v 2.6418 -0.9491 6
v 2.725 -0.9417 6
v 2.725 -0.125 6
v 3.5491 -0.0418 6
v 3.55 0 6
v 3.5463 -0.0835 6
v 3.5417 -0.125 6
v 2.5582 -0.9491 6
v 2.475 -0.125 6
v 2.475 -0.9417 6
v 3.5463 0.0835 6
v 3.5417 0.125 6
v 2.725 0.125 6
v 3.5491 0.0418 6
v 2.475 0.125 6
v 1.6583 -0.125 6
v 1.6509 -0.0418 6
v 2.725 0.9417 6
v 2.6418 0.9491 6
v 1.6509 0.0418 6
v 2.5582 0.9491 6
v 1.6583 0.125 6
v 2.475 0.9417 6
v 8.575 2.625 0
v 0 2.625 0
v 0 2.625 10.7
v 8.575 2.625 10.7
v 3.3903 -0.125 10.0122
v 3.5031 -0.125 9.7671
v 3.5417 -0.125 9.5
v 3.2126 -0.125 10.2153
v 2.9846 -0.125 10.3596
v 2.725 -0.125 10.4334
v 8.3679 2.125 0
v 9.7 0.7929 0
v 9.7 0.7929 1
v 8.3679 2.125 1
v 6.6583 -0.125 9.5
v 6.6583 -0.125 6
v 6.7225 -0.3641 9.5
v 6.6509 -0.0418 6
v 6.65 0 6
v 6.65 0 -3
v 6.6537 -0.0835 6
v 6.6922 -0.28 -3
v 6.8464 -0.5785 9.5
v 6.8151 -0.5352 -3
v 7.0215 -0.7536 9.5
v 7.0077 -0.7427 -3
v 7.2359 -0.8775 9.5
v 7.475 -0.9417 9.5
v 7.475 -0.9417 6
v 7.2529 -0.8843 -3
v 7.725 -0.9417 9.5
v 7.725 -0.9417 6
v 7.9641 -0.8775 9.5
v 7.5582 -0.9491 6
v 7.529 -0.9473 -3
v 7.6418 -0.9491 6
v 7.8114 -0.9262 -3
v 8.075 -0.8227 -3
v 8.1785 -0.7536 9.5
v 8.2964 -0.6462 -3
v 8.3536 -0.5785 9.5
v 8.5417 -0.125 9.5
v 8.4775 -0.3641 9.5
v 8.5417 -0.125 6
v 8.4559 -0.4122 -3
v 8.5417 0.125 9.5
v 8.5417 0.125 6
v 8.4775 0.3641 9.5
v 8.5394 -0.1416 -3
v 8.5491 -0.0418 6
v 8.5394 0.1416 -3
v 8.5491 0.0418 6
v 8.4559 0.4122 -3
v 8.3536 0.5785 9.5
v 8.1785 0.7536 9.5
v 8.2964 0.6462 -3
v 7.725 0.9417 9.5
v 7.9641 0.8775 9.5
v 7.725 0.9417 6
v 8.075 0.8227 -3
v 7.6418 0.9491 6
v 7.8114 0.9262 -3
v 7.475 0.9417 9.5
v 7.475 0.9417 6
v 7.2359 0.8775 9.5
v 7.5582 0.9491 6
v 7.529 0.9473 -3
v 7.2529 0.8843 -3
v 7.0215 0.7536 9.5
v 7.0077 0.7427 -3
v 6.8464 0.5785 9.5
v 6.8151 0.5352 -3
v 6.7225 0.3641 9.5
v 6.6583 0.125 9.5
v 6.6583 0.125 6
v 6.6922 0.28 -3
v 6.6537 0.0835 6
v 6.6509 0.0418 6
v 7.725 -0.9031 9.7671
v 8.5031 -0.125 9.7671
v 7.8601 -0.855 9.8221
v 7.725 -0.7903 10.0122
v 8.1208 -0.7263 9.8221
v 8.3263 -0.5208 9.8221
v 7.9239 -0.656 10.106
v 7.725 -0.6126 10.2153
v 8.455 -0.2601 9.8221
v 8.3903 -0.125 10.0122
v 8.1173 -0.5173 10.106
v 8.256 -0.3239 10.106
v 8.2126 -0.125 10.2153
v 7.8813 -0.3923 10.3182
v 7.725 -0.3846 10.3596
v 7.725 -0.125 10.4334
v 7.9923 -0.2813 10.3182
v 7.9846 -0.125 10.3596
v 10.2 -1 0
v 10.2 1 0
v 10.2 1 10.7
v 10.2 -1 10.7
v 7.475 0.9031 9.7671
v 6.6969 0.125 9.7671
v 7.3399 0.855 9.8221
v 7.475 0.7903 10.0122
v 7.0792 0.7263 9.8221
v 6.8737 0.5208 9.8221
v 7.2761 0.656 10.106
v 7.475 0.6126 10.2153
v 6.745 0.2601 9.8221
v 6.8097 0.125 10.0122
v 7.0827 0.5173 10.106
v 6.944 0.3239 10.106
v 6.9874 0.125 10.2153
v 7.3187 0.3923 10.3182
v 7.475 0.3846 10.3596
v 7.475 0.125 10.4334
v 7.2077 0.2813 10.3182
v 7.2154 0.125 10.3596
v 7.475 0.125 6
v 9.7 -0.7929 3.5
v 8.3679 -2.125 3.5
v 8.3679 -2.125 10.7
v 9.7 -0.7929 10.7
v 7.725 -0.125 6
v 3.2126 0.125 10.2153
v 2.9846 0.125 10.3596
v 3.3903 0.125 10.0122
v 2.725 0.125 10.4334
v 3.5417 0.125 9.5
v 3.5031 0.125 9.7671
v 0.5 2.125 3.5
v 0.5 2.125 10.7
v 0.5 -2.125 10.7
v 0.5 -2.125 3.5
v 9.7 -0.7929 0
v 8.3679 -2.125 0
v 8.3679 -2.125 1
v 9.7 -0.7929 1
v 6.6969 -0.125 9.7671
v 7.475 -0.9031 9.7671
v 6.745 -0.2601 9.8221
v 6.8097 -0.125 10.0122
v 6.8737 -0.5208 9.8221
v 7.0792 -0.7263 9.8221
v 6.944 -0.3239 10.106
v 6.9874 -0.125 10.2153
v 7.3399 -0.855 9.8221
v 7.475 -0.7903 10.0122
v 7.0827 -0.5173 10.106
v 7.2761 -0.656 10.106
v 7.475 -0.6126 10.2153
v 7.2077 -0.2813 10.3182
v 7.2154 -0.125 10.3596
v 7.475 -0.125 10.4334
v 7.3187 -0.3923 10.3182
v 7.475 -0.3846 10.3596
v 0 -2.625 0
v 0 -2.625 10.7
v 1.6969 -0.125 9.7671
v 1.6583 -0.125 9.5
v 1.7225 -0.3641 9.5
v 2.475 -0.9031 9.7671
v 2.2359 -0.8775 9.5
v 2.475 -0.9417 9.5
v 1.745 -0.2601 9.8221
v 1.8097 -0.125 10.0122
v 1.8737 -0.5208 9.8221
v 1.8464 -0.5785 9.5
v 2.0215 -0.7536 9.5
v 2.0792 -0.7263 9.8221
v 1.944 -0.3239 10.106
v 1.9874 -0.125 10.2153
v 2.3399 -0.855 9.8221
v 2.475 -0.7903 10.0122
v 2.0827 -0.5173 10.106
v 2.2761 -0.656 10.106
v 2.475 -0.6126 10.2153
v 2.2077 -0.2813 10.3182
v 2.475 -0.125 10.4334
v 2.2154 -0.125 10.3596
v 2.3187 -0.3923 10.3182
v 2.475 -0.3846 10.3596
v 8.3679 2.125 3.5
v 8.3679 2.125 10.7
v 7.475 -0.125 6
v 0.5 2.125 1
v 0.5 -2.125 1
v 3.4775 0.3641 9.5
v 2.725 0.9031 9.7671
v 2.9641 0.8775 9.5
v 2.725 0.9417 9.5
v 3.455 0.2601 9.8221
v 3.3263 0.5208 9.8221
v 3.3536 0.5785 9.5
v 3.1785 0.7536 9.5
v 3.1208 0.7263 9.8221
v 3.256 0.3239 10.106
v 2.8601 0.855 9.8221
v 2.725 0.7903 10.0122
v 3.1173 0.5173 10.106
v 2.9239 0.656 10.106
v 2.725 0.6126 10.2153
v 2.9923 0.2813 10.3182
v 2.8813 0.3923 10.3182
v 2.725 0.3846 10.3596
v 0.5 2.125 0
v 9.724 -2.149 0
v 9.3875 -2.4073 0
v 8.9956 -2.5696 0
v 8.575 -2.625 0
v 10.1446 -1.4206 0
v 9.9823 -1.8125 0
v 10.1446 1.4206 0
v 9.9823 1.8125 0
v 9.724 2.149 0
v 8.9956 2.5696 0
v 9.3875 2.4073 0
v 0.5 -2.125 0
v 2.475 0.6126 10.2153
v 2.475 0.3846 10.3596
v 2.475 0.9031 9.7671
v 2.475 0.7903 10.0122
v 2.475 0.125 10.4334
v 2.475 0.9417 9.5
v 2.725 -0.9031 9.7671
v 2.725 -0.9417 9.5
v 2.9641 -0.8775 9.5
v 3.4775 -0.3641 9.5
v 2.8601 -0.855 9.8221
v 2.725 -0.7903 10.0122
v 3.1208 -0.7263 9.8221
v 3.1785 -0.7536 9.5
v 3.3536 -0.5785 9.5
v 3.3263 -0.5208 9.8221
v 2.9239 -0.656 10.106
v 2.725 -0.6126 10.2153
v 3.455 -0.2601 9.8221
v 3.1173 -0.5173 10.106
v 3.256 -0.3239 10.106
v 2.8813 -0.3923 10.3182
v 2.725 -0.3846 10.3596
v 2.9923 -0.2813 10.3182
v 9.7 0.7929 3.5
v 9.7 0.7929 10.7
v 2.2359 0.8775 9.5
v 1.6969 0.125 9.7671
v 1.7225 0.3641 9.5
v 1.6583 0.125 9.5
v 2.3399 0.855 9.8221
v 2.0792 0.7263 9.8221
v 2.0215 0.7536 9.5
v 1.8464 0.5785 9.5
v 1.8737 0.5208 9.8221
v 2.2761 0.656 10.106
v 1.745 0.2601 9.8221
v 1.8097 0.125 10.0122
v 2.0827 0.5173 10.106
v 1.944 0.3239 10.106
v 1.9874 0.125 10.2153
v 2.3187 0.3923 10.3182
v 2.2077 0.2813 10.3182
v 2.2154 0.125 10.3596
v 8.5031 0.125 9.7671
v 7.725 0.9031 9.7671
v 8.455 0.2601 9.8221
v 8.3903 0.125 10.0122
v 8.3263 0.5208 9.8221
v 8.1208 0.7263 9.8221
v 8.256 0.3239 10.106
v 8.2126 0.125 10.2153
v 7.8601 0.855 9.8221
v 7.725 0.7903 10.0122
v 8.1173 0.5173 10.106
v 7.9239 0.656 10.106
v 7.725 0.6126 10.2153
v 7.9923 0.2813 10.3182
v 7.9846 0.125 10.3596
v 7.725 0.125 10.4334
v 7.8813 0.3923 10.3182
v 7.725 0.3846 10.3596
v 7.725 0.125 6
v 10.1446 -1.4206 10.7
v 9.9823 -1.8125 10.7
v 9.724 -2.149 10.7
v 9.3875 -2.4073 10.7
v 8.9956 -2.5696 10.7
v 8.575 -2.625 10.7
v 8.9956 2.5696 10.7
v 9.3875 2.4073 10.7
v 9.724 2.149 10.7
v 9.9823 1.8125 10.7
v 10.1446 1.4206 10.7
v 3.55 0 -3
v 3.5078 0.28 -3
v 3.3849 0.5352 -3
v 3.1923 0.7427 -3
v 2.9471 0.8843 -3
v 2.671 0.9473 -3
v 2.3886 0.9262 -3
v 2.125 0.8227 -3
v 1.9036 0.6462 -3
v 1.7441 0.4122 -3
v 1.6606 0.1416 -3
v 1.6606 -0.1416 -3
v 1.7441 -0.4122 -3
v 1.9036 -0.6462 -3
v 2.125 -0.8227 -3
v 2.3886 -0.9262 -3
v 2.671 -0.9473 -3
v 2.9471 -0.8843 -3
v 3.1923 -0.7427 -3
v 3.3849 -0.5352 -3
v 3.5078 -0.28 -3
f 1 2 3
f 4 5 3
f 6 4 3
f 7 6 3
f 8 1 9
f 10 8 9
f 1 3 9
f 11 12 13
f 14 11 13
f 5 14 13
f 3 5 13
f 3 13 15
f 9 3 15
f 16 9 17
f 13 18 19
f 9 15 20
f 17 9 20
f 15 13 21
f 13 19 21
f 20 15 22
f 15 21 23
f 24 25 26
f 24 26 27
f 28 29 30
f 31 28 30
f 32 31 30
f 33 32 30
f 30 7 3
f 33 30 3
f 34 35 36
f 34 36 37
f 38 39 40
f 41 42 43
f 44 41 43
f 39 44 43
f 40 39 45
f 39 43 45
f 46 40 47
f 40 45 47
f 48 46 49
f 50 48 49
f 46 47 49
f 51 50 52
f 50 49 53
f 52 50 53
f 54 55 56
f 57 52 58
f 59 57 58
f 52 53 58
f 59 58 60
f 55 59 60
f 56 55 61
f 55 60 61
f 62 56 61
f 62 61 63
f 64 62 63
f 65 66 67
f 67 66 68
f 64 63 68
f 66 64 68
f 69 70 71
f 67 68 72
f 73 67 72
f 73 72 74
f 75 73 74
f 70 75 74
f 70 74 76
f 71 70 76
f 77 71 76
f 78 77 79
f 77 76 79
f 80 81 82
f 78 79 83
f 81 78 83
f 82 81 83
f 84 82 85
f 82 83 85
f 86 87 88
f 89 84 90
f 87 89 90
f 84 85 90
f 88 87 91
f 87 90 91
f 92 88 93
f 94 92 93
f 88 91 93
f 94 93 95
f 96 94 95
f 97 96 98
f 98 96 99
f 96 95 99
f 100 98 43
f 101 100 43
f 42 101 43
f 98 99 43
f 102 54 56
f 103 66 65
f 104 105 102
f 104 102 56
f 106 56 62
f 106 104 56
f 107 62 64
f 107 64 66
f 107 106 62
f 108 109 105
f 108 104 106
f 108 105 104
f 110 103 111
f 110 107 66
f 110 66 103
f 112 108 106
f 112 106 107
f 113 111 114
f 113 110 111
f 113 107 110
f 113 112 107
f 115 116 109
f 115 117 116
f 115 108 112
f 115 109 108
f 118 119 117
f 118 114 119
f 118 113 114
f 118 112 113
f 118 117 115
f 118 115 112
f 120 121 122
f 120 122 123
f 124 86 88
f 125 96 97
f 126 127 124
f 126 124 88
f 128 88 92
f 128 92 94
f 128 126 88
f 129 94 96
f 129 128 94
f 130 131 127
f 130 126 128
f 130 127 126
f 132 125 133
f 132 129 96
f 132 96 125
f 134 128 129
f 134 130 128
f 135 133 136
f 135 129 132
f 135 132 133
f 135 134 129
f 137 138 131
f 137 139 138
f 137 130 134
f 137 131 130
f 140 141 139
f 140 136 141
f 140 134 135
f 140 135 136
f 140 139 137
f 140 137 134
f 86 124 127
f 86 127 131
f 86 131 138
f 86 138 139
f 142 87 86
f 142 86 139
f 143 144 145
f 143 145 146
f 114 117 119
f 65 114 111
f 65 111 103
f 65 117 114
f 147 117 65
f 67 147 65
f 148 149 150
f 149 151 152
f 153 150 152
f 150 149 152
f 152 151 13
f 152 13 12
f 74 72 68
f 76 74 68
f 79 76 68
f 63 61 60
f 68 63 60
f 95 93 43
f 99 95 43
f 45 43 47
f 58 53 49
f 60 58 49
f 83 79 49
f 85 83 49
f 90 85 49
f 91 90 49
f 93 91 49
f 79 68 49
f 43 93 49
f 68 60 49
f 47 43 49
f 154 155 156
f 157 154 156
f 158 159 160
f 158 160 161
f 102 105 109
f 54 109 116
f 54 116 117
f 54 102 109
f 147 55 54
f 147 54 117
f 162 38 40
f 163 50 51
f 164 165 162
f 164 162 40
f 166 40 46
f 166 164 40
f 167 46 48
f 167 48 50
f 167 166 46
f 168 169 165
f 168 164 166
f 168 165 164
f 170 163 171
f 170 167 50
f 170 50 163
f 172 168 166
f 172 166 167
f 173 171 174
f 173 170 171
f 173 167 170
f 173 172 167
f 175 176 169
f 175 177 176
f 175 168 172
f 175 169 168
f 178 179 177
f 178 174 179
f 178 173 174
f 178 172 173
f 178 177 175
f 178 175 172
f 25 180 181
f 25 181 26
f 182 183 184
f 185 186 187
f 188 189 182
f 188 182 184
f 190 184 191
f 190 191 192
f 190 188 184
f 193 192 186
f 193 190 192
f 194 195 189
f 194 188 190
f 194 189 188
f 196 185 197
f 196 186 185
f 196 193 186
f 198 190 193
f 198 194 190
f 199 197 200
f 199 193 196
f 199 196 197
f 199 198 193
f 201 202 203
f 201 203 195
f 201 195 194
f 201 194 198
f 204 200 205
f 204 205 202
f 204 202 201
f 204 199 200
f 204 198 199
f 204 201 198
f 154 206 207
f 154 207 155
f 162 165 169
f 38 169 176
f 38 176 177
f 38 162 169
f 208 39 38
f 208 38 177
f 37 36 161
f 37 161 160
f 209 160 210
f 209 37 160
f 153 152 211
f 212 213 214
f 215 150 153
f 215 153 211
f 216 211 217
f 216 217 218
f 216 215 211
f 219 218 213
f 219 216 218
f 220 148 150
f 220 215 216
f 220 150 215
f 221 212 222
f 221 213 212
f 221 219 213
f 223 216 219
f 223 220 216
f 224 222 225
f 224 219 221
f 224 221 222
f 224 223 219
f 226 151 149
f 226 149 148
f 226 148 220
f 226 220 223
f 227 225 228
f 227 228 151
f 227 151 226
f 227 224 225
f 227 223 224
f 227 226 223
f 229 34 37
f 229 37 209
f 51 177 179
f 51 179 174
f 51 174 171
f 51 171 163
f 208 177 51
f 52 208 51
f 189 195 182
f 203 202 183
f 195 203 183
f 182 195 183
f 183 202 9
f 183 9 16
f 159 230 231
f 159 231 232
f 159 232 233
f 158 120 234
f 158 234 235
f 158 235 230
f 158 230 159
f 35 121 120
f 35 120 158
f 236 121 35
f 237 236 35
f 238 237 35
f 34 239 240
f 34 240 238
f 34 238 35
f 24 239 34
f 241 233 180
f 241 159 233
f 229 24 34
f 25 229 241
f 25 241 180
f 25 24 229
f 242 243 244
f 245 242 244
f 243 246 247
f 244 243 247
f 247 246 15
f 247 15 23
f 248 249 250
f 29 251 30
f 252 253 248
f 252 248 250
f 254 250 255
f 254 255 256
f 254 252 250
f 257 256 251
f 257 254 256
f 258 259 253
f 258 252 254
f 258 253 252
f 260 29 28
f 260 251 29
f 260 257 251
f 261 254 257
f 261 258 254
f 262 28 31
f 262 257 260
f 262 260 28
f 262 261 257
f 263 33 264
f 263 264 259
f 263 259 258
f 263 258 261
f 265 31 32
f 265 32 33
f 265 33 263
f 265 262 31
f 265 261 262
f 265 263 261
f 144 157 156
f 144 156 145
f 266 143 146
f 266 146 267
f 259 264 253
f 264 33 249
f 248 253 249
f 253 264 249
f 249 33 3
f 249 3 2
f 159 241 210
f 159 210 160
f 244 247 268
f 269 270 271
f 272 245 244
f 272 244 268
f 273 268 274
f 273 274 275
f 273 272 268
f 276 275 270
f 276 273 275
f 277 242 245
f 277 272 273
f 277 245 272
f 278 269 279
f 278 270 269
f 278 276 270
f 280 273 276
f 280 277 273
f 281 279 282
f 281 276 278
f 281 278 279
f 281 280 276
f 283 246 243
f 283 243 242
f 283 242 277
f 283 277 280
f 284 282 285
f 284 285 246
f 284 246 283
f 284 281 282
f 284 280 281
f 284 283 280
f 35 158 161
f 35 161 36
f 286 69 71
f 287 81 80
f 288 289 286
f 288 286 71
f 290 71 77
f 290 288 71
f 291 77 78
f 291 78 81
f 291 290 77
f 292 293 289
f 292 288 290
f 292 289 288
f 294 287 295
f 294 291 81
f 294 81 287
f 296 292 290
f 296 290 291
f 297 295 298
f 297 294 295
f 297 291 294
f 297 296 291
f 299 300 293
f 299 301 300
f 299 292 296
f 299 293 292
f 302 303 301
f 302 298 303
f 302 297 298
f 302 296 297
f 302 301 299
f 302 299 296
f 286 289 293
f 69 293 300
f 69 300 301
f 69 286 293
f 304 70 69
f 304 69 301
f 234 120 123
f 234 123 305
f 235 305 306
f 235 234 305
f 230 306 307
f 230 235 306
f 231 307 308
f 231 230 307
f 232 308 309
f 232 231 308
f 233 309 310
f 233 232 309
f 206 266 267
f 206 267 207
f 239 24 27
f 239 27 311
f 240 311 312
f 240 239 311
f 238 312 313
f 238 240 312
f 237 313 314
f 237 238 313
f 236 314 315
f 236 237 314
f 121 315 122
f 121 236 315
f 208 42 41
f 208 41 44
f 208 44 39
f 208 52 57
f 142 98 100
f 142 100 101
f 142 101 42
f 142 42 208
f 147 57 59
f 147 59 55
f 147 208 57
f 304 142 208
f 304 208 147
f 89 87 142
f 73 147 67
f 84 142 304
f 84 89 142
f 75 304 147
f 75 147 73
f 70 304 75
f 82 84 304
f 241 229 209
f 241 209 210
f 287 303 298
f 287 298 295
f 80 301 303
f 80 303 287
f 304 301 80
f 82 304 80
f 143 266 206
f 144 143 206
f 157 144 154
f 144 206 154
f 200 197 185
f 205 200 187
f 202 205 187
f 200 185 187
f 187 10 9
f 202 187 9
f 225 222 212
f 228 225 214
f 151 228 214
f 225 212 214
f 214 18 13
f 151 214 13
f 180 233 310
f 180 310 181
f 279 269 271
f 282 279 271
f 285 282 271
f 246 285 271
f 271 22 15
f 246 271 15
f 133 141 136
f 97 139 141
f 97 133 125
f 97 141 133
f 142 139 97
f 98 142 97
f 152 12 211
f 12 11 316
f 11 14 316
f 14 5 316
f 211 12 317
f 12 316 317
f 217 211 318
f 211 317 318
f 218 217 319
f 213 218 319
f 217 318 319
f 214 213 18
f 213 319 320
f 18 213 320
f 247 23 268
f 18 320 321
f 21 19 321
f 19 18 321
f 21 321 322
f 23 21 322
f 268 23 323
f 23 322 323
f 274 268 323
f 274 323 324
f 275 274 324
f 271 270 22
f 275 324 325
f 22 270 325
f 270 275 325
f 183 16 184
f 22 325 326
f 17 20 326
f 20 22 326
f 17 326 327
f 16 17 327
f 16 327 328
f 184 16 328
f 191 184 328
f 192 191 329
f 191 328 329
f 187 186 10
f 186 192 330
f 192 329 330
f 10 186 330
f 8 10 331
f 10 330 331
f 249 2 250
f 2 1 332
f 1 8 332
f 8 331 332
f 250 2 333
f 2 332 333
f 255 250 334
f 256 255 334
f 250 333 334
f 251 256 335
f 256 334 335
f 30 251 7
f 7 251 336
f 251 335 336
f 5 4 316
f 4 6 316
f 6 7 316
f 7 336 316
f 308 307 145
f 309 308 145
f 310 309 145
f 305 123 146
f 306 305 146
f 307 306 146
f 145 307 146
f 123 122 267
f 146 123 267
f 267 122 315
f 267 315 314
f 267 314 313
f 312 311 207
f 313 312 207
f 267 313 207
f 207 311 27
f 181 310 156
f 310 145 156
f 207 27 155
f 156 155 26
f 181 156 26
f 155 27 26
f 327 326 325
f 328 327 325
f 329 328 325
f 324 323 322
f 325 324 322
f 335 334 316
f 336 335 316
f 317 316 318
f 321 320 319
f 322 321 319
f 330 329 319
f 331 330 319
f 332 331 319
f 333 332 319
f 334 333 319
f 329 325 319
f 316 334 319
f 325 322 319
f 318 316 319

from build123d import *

# Parameters (mm, degrees)
BOSS_EXTRUDE1_DEPTH        = 10.7
BOSS_EXTRUDE5_DEPTH        = 9.5
BOSS_EXTRUDE5_DEPTH_BACK   = 3
SKETCH1_4_R                = 0.95
BOSS_EXTRUDE5_2_DEPTH      = 9.5
BOSS_EXTRUDE5_2_DEPTH_BACK = 3
BOSS_EXTRUDE3_DEPTH        = 2.5
DOME1_FACE_RADIUS          = 0.95
DOME1_HEIGHT               = 0.95
DOME2_FACE_RADIUS          = 0.95
DOME2_HEIGHT               = 0.95
CUT_EXTRUDE1_DEPTH         = 14.85390288


with BuildPart() as part:
    # Sketch1 → Boss-Extrude1 (new body)
    with BuildSketch(Plane.XY):
        with BuildLine():
            Line((0, -2.625), (0, 2.625))
            Line((0, 2.625), (8.575, 2.625))
            ThreePointArc((8.575, 2.625), (9.724048519, 2.149048519), (10.2, 1))
            Line((10.2, 1), (10.2, -1))
            ThreePointArc((10.2, -1), (9.724048519, -2.149048519), (8.575, -2.625))
            Line((8.575, -2.625), (0, -2.625))
        make_face()
        Polygon((0.5, -2.125), (8.367893219, -2.125), (9.7, -0.792893219), (9.7, 0.792893219), (8.367893219, 2.125), (0.5, 2.125), align=None, mode=Mode.SUBTRACT)
    extrude(amount=BOSS_EXTRUDE1_DEPTH)

    # Sketch3 → Boss-Extrude3 (add)
    with BuildSketch(Plane(origin=(0, 0, 1), x_dir=(-1, 0, 0), z_dir=(0, 0, -1))):
        Polygon((-0.5, -2.125), (-0.5, 2.125), (-8.367893219, 2.125), (-9.7, 0.792893219), (-9.7, -0.792893219), (-8.367893219, -2.125), align=None)
    extrude(amount=-BOSS_EXTRUDE3_DEPTH)


with BuildPart() as body_2:
    # Sketch1<4> → Boss-Extrude5 (new, two sides: drawn at the far end of the back side and taken through both)
    with BuildSketch(Plane.XY.offset(-BOSS_EXTRUDE5_DEPTH_BACK)):
        with Locations((2.6, 0)):
            Circle(SKETCH1_4_R)
    extrude(amount=BOSS_EXTRUDE5_DEPTH + BOSS_EXTRUDE5_DEPTH_BACK)

    # Dome2: a dome of height H over a round flat face of radius A is a cap of a sphere of radius (A * A + H * H) / (2 * H)
    dome2_r = (DOME2_FACE_RADIUS * DOME2_FACE_RADIUS + DOME2_HEIGHT * DOME2_HEIGHT) / (2 * DOME2_HEIGHT)
    dome2_base = Plane((2.6, 0, 9.5), z_dir=(0, 0, 1))
    with Locations(dome2_base.offset(DOME2_HEIGHT - dome2_r)):
        dome2_ball = Sphere(dome2_r, mode=Mode.PRIVATE)
    add(split(dome2_ball, bisect_by=dome2_base, keep=Keep.TOP, mode=Mode.PRIVATE))


with BuildPart() as body_3:
    # Sketch1<4> → Boss-Extrude5 2 (new, two sides: drawn at the far end of the back side and taken through both)
    with BuildSketch(Plane.XY.offset(-BOSS_EXTRUDE5_2_DEPTH_BACK)):
        with Locations(Location((7.6, 0, 0), (0, 0, 180))):
            Circle(SKETCH1_4_R)
    extrude(amount=BOSS_EXTRUDE5_2_DEPTH + BOSS_EXTRUDE5_2_DEPTH_BACK)

    # Dome1: a dome of height H over a round flat face of radius A is a cap of a sphere of radius (A * A + H * H) / (2 * H)
    dome1_r = (DOME1_FACE_RADIUS * DOME1_FACE_RADIUS + DOME1_HEIGHT * DOME1_HEIGHT) / (2 * DOME1_HEIGHT)
    dome1_base = Plane((7.6, 0, 9.5), z_dir=(0, 0, 1))
    with Locations(dome1_base.offset(DOME1_HEIGHT - dome1_r)):
        dome1_ball = Sphere(dome1_r, mode=Mode.PRIVATE)
    add(split(dome1_ball, bisect_by=dome1_base, keep=Keep.TOP, mode=Mode.PRIVATE))


with BuildPart() as cut_extrude1_tool:
    # Sketch4 → Cut-Extrude1 (new, through all)
    with BuildSketch(Plane.XY.offset(6)):
        with BuildLine():
            Line((7.475, 0.94174041), (7.475, 0.125))
            Line((7.475, 0.125), (6.65825959, 0.125))
            ThreePointArc((6.65825959, 0.125), (6.65, 0), (6.65825959, -0.125))
            Line((6.65825959, -0.125), (7.475, -0.125))
            Line((7.475, -0.125), (7.475, -0.94174041))
            ThreePointArc((7.475, -0.94174041), (7.6, -0.95), (7.725, -0.94174041))
            Line((7.725, -0.94174041), (7.725, -0.125))
            Line((7.725, -0.125), (8.54174041, -0.125))
            ThreePointArc((8.54174041, -0.125), (8.55, 0), (8.54174041, 0.125))
            Line((8.54174041, 0.125), (7.725, 0.125))
            Line((7.725, 0.125), (7.725, 0.94174041))
            ThreePointArc((7.725, 0.94174041), (7.6, 0.95), (7.475, 0.94174041))
        make_face()
        with BuildLine():
            Line((3.54174041, -0.125), (2.725, -0.125))
            Line((2.725, -0.125), (2.725, -0.94174041))
            ThreePointArc((2.725, -0.94174041), (2.6, -0.95), (2.475, -0.94174041))
            Line((2.475, -0.94174041), (2.475, -0.125))
            Line((2.475, -0.125), (1.65825959, -0.125))
            ThreePointArc((1.65825959, -0.125), (1.65, 0), (1.65825959, 0.125))
            Line((1.65825959, 0.125), (2.475, 0.125))
            Line((2.475, 0.125), (2.475, 0.94174041))
            ThreePointArc((2.475, 0.94174041), (2.6, 0.95), (2.725, 0.94174041))
            Line((2.725, 0.94174041), (2.725, 0.125))
            Line((2.725, 0.125), (3.54174041, 0.125))
            ThreePointArc((3.54174041, 0.125), (3.55, 0), (3.54174041, -0.125))
        make_face()
    extrude(amount=CUT_EXTRUDE1_DEPTH)


with BuildPart() as body_2_1:
    add(body_2.part)

    # Cut-Extrude1: cut by cut_extrude1_tool
    add(cut_extrude1_tool.part, mode=Mode.SUBTRACT)


with BuildPart() as body_3_1:
    add(body_3.part)

    # Cut-Extrude1: cut by cut_extrude1_tool
    add(cut_extrude1_tool.part, mode=Mode.SUBTRACT)


solid = Compound([part.part, body_2_1.part, body_3_1.part])
